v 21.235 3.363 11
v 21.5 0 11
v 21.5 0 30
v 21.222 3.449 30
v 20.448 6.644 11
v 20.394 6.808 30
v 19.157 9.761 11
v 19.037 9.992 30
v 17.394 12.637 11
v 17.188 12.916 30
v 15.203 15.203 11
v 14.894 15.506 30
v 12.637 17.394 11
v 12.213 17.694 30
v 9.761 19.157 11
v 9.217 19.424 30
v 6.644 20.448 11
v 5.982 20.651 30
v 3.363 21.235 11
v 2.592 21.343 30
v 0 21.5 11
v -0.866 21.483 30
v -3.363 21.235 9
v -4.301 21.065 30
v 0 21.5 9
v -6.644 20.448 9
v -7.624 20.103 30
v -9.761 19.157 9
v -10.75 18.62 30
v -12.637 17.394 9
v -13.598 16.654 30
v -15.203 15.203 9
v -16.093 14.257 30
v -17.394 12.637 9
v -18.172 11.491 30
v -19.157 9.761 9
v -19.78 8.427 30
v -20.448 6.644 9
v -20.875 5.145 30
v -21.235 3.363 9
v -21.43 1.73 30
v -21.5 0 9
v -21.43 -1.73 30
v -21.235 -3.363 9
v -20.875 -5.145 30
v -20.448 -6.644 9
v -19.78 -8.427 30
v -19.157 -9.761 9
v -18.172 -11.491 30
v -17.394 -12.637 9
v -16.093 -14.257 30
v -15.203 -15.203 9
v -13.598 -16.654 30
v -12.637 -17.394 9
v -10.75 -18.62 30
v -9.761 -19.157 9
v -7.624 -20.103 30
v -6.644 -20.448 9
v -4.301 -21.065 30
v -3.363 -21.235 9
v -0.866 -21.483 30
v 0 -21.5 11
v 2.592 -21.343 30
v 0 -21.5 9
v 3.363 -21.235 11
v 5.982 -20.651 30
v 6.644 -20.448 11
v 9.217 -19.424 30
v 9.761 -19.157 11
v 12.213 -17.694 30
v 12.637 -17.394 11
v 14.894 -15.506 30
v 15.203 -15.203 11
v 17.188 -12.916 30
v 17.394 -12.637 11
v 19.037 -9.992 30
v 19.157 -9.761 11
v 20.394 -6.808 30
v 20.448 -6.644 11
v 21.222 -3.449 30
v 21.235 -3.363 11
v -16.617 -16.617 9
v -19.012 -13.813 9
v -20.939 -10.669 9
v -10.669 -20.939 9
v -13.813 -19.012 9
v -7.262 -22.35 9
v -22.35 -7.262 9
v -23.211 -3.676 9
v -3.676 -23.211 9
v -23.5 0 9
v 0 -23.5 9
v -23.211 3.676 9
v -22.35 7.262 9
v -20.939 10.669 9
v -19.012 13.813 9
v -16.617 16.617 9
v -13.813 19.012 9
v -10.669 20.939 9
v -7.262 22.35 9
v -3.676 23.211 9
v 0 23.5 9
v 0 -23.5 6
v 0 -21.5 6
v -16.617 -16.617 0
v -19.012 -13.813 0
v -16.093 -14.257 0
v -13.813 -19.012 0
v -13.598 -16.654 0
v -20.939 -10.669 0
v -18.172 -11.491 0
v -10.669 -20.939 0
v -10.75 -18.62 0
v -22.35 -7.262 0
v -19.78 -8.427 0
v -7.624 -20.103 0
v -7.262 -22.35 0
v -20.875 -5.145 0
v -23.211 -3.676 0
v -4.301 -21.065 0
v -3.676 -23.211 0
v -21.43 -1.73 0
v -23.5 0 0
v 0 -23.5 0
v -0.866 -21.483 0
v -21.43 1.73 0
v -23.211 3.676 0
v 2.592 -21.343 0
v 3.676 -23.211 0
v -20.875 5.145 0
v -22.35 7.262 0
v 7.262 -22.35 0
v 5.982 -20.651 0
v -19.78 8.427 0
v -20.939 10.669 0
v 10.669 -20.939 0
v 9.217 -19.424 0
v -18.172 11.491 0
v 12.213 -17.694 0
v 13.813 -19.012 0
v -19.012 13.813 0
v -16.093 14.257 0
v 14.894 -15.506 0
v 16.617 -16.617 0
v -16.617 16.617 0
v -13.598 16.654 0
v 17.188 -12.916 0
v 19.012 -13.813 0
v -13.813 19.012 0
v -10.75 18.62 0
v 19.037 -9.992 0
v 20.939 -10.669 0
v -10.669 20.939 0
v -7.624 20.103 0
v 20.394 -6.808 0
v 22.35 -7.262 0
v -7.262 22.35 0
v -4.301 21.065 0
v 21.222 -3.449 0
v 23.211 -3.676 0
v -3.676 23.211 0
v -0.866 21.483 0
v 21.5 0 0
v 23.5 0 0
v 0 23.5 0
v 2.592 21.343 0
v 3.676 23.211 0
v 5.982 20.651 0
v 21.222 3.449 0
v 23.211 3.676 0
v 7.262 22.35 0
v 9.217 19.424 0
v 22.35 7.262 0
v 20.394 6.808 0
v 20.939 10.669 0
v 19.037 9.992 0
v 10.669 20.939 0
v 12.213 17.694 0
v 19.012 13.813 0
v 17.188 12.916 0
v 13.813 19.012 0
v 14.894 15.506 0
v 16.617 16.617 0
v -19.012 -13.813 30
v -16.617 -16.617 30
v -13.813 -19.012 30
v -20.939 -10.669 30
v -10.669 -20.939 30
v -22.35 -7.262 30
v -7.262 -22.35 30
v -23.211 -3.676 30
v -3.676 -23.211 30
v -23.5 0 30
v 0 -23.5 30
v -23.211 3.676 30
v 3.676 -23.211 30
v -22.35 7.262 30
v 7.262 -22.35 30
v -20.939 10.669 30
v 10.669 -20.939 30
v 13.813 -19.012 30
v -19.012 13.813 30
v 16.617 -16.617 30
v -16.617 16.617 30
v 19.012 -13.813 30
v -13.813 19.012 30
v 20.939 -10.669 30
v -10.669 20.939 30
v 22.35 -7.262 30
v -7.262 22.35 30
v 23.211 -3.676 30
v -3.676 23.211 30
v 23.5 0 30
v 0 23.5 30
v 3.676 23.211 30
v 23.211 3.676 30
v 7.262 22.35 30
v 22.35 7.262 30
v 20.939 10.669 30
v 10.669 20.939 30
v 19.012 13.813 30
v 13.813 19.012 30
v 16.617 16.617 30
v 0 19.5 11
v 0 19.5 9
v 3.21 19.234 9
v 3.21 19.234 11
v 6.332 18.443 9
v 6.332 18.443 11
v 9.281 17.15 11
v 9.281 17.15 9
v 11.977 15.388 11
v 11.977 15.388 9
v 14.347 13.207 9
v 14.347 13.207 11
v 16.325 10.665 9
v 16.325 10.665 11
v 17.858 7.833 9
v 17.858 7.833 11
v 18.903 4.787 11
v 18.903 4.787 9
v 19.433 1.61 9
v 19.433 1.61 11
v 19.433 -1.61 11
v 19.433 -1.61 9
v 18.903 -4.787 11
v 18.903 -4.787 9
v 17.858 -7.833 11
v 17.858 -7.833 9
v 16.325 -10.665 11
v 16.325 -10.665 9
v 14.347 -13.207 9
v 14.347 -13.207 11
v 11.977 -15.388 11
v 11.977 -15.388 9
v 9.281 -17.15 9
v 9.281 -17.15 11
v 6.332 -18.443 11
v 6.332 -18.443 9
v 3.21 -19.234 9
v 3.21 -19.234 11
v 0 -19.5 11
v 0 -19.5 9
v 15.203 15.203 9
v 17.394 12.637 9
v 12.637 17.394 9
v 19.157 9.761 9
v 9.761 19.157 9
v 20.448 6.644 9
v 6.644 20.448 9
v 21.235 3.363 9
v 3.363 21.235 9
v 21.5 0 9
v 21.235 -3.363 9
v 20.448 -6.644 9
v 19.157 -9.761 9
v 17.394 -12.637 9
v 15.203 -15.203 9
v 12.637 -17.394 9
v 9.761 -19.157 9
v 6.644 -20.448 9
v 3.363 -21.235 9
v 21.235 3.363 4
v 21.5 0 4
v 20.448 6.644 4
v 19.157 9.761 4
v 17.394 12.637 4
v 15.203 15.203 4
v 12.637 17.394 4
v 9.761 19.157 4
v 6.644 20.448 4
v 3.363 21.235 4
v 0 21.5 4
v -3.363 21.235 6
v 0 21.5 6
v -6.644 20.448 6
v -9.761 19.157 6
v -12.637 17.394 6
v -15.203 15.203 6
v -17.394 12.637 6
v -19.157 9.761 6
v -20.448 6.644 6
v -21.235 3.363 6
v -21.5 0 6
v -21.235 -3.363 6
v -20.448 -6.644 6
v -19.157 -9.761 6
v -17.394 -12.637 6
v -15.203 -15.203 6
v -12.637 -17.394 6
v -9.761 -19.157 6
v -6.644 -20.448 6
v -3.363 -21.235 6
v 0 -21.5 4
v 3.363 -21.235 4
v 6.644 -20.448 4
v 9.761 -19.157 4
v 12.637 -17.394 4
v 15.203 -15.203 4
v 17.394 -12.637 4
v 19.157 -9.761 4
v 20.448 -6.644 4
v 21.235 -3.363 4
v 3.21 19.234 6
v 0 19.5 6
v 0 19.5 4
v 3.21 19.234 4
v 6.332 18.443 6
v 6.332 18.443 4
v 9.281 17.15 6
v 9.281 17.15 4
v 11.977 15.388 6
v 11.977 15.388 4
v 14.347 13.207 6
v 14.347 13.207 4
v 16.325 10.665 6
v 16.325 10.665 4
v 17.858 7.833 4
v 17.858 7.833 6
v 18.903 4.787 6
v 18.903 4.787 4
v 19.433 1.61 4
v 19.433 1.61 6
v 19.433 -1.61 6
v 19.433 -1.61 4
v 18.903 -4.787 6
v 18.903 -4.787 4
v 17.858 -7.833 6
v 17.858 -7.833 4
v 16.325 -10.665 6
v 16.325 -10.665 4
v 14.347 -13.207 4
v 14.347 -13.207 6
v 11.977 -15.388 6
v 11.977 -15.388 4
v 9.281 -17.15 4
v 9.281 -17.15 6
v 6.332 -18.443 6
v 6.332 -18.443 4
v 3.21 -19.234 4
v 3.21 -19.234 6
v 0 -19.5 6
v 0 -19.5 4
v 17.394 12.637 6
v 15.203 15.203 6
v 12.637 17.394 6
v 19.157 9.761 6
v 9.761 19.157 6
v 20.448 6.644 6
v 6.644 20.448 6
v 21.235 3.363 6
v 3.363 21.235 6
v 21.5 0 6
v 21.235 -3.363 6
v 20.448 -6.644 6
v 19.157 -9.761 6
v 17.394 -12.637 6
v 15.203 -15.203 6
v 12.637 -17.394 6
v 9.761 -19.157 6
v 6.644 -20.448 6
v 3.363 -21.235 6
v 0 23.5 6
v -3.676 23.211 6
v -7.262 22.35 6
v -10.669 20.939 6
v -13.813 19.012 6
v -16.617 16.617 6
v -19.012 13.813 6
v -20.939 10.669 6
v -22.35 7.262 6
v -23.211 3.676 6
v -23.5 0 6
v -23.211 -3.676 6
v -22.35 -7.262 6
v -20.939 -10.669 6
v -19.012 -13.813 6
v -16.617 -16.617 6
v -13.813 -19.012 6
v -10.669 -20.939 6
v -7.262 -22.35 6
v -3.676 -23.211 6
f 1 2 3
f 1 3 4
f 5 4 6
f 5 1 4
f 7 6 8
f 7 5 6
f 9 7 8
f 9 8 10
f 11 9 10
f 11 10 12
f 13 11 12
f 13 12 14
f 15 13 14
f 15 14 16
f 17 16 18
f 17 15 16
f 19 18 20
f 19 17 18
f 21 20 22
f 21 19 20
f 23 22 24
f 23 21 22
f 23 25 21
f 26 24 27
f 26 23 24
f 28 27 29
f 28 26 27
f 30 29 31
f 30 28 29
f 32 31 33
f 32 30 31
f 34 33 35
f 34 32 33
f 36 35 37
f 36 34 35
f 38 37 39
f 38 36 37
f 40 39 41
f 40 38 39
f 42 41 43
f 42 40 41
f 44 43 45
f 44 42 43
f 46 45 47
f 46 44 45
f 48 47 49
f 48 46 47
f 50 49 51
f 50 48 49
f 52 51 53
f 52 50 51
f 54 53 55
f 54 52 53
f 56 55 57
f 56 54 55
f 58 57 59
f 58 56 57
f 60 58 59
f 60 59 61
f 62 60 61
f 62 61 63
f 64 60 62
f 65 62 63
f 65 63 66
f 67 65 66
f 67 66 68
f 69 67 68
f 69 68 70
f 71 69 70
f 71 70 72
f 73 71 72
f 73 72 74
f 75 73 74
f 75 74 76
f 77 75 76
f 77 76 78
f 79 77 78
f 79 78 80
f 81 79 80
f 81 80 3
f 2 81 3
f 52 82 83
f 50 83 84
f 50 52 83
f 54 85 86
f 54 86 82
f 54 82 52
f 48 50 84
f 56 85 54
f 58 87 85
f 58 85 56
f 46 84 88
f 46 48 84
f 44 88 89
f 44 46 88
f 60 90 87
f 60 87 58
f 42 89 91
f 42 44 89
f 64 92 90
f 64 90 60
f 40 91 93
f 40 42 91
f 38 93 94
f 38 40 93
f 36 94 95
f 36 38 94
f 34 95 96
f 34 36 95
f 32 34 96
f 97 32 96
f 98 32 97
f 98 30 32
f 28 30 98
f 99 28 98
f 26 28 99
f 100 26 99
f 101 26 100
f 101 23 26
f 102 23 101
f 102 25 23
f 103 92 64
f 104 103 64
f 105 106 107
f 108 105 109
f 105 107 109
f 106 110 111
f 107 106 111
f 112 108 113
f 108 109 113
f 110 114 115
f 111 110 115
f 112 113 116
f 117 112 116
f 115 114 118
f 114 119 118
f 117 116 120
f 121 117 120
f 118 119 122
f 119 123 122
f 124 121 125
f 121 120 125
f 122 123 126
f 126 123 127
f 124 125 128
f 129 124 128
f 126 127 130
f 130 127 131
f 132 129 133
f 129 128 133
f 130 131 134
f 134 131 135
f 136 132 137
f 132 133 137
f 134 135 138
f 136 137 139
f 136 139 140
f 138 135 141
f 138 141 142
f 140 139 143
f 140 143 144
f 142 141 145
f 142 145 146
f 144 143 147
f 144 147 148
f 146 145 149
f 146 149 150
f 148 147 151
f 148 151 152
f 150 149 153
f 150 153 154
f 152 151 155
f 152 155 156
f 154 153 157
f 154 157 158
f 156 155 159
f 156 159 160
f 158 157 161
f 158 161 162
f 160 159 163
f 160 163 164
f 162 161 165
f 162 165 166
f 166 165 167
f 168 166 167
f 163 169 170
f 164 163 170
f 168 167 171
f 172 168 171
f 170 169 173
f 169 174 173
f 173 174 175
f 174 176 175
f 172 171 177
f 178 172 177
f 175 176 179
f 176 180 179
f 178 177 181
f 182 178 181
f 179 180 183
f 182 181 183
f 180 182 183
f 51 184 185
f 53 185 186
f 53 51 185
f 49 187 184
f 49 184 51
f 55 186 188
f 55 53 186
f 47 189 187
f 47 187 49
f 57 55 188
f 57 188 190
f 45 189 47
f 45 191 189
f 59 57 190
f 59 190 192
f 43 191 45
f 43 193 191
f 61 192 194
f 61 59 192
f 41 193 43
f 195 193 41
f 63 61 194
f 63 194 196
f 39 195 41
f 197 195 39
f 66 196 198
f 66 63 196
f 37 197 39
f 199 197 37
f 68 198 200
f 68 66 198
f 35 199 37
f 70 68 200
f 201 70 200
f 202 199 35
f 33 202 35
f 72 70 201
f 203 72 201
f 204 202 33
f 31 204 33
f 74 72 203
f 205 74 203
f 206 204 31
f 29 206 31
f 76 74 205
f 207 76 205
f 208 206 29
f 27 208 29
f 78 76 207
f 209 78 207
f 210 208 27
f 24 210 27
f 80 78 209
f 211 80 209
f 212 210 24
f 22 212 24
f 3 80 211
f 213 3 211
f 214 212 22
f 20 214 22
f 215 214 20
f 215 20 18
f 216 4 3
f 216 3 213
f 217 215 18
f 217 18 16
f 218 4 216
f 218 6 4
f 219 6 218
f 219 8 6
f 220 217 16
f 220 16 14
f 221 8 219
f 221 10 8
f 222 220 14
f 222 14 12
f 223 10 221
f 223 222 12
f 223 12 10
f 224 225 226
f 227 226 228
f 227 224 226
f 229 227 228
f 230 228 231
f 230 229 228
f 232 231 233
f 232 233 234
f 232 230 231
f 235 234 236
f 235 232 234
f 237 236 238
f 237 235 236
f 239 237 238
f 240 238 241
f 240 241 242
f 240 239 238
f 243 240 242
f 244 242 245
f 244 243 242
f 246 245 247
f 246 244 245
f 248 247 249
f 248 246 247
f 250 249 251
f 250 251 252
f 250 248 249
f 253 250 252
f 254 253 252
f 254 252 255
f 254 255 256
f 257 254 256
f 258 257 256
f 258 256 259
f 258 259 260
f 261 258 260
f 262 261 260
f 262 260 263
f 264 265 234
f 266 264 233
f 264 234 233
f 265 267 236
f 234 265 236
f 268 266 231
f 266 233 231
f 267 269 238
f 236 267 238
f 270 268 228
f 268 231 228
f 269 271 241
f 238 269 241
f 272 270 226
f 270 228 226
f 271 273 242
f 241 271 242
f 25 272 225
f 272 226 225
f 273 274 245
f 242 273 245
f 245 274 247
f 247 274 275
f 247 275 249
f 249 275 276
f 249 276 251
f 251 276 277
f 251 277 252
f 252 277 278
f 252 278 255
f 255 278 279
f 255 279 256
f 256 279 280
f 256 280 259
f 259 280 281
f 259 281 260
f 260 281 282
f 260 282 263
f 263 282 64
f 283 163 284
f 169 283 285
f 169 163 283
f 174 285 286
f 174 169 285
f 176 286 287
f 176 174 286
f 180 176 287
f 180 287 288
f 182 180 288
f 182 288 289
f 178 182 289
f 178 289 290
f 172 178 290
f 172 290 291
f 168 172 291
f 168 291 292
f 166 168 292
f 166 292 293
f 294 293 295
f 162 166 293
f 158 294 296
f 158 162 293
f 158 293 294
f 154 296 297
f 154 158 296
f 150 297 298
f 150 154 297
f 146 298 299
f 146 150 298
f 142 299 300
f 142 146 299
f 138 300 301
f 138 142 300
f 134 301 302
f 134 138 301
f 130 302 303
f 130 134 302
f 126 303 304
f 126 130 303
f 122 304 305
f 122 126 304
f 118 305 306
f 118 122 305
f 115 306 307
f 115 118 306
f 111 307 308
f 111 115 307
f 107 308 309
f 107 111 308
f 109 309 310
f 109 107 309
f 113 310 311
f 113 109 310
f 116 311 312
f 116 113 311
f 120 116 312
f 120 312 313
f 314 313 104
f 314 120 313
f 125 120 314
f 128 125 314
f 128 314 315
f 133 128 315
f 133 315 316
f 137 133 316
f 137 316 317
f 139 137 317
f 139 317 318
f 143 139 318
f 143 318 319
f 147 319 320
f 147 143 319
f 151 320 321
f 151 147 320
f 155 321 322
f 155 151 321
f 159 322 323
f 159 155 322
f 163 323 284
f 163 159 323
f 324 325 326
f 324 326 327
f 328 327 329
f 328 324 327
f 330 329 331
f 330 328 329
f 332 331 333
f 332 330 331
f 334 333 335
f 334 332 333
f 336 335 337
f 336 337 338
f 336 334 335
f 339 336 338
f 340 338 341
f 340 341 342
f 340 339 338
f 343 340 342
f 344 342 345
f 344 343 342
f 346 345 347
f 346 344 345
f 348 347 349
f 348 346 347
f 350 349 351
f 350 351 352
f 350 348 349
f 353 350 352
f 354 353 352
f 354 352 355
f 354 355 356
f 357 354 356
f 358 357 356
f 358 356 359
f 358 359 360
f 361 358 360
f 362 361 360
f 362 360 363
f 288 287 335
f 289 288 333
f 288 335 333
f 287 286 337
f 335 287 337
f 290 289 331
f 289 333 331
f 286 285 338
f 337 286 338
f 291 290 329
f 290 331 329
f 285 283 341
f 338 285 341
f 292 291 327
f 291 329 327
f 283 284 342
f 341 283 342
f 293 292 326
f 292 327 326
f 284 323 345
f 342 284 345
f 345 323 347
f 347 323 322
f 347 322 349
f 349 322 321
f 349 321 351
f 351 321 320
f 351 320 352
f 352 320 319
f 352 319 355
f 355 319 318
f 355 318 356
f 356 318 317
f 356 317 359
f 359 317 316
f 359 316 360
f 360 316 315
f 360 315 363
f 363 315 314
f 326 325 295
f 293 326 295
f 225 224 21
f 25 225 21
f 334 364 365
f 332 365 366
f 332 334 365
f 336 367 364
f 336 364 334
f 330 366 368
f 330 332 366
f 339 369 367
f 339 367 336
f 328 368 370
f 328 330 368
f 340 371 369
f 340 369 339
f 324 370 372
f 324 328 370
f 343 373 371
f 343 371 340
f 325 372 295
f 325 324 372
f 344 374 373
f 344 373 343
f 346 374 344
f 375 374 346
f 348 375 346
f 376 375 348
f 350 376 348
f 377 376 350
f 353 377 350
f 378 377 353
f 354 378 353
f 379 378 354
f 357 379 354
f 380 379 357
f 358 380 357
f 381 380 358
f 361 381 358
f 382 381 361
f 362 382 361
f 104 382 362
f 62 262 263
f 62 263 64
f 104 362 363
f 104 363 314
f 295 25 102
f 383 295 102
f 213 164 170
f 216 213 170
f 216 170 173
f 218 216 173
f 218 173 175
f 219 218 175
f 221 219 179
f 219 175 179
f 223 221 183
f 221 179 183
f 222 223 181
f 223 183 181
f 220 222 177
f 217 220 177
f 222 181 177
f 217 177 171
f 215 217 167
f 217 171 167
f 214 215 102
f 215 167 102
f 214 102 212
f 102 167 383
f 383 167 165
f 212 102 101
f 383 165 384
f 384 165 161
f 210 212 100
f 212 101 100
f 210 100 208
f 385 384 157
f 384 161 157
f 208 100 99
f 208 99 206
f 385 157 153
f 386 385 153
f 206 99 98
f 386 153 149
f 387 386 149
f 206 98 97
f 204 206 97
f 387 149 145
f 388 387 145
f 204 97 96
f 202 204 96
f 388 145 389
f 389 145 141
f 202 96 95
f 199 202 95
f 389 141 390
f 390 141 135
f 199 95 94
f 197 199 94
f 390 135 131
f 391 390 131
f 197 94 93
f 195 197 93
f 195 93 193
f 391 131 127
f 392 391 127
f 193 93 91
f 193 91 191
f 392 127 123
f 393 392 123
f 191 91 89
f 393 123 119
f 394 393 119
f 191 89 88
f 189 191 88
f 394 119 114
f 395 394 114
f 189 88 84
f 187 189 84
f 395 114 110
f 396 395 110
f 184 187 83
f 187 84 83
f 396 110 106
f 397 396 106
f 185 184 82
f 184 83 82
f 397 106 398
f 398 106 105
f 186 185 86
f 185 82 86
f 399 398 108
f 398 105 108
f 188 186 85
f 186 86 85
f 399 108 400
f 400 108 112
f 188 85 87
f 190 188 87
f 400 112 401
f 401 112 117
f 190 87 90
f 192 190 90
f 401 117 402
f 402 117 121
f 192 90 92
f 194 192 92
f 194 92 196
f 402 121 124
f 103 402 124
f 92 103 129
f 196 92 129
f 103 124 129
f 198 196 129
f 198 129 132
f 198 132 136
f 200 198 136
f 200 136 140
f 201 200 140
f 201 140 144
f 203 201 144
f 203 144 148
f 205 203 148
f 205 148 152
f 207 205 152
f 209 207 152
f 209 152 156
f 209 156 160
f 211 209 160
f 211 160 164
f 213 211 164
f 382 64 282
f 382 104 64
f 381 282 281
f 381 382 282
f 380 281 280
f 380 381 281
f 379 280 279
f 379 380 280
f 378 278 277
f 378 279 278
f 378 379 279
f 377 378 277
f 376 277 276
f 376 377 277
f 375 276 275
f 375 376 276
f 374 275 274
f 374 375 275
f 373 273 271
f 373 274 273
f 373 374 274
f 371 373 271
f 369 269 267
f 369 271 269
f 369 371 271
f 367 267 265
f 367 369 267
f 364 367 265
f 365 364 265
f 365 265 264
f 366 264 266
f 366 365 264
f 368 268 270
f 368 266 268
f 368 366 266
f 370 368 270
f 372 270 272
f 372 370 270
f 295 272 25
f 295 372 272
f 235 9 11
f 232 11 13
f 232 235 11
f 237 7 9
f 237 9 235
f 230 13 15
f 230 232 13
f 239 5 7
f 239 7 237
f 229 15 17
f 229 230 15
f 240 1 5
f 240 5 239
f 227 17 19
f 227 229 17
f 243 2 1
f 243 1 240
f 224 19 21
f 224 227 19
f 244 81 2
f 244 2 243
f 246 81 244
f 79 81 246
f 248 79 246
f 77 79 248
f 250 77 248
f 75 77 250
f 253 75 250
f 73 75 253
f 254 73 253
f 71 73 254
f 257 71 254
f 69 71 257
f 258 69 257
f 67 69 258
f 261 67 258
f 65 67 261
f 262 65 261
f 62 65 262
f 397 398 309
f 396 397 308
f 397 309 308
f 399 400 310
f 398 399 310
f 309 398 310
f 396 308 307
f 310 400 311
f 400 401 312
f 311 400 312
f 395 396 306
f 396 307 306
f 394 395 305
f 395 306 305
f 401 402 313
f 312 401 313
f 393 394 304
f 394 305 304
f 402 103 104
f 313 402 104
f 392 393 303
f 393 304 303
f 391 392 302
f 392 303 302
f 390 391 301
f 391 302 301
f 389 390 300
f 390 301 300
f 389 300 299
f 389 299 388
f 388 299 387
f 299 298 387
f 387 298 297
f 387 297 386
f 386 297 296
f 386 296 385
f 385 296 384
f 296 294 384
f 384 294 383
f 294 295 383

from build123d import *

# Parameters (mm, degrees)
F0_R     = 23.5
F0_R_2   = 21.5
F1_DEPTH = 30
F2_W     = 47
F2_H     = 3
F3_DEPTH = 23.501
F4_W     = 2
F4_H     = 2
F5_ANGLE = 180


with BuildPart() as f1:
    # F0 (on Top) → F1 (new body)
    with BuildSketch(Plane.XY):
        Circle(F0_R)
        Circle(F0_R_2, mode=Mode.SUBTRACT)
    extrude(amount=F1_DEPTH)

    # F2 (on Right) → F3 (cut, through all)
    with BuildSketch(Plane.YZ):
        with Locations((0, 7.5)):
            Rectangle(F2_W, F2_H)
    extrude(amount=-F3_DEPTH, mode=Mode.SUBTRACT)

    # F4 (on Front) → F5 (revolve, symmetric)
    with BuildSketch(Plane.XZ) as f5_sk:
        with Locations((20.5, 10)):
            Rectangle(F4_W, F4_H)
        with Locations((20.5, 5)):
            Rectangle(F4_W, F4_H)
    revolve(axis=Axis((0, 0, 9.00836), (0, 0, 1)), revolution_arc=F5_ANGLE / 2)
    revolve(f5_sk.sketch, axis=Axis((0, 0, 9.00836), (0, 0, -1)), revolution_arc=F5_ANGLE / 2)


solid = f1.part
